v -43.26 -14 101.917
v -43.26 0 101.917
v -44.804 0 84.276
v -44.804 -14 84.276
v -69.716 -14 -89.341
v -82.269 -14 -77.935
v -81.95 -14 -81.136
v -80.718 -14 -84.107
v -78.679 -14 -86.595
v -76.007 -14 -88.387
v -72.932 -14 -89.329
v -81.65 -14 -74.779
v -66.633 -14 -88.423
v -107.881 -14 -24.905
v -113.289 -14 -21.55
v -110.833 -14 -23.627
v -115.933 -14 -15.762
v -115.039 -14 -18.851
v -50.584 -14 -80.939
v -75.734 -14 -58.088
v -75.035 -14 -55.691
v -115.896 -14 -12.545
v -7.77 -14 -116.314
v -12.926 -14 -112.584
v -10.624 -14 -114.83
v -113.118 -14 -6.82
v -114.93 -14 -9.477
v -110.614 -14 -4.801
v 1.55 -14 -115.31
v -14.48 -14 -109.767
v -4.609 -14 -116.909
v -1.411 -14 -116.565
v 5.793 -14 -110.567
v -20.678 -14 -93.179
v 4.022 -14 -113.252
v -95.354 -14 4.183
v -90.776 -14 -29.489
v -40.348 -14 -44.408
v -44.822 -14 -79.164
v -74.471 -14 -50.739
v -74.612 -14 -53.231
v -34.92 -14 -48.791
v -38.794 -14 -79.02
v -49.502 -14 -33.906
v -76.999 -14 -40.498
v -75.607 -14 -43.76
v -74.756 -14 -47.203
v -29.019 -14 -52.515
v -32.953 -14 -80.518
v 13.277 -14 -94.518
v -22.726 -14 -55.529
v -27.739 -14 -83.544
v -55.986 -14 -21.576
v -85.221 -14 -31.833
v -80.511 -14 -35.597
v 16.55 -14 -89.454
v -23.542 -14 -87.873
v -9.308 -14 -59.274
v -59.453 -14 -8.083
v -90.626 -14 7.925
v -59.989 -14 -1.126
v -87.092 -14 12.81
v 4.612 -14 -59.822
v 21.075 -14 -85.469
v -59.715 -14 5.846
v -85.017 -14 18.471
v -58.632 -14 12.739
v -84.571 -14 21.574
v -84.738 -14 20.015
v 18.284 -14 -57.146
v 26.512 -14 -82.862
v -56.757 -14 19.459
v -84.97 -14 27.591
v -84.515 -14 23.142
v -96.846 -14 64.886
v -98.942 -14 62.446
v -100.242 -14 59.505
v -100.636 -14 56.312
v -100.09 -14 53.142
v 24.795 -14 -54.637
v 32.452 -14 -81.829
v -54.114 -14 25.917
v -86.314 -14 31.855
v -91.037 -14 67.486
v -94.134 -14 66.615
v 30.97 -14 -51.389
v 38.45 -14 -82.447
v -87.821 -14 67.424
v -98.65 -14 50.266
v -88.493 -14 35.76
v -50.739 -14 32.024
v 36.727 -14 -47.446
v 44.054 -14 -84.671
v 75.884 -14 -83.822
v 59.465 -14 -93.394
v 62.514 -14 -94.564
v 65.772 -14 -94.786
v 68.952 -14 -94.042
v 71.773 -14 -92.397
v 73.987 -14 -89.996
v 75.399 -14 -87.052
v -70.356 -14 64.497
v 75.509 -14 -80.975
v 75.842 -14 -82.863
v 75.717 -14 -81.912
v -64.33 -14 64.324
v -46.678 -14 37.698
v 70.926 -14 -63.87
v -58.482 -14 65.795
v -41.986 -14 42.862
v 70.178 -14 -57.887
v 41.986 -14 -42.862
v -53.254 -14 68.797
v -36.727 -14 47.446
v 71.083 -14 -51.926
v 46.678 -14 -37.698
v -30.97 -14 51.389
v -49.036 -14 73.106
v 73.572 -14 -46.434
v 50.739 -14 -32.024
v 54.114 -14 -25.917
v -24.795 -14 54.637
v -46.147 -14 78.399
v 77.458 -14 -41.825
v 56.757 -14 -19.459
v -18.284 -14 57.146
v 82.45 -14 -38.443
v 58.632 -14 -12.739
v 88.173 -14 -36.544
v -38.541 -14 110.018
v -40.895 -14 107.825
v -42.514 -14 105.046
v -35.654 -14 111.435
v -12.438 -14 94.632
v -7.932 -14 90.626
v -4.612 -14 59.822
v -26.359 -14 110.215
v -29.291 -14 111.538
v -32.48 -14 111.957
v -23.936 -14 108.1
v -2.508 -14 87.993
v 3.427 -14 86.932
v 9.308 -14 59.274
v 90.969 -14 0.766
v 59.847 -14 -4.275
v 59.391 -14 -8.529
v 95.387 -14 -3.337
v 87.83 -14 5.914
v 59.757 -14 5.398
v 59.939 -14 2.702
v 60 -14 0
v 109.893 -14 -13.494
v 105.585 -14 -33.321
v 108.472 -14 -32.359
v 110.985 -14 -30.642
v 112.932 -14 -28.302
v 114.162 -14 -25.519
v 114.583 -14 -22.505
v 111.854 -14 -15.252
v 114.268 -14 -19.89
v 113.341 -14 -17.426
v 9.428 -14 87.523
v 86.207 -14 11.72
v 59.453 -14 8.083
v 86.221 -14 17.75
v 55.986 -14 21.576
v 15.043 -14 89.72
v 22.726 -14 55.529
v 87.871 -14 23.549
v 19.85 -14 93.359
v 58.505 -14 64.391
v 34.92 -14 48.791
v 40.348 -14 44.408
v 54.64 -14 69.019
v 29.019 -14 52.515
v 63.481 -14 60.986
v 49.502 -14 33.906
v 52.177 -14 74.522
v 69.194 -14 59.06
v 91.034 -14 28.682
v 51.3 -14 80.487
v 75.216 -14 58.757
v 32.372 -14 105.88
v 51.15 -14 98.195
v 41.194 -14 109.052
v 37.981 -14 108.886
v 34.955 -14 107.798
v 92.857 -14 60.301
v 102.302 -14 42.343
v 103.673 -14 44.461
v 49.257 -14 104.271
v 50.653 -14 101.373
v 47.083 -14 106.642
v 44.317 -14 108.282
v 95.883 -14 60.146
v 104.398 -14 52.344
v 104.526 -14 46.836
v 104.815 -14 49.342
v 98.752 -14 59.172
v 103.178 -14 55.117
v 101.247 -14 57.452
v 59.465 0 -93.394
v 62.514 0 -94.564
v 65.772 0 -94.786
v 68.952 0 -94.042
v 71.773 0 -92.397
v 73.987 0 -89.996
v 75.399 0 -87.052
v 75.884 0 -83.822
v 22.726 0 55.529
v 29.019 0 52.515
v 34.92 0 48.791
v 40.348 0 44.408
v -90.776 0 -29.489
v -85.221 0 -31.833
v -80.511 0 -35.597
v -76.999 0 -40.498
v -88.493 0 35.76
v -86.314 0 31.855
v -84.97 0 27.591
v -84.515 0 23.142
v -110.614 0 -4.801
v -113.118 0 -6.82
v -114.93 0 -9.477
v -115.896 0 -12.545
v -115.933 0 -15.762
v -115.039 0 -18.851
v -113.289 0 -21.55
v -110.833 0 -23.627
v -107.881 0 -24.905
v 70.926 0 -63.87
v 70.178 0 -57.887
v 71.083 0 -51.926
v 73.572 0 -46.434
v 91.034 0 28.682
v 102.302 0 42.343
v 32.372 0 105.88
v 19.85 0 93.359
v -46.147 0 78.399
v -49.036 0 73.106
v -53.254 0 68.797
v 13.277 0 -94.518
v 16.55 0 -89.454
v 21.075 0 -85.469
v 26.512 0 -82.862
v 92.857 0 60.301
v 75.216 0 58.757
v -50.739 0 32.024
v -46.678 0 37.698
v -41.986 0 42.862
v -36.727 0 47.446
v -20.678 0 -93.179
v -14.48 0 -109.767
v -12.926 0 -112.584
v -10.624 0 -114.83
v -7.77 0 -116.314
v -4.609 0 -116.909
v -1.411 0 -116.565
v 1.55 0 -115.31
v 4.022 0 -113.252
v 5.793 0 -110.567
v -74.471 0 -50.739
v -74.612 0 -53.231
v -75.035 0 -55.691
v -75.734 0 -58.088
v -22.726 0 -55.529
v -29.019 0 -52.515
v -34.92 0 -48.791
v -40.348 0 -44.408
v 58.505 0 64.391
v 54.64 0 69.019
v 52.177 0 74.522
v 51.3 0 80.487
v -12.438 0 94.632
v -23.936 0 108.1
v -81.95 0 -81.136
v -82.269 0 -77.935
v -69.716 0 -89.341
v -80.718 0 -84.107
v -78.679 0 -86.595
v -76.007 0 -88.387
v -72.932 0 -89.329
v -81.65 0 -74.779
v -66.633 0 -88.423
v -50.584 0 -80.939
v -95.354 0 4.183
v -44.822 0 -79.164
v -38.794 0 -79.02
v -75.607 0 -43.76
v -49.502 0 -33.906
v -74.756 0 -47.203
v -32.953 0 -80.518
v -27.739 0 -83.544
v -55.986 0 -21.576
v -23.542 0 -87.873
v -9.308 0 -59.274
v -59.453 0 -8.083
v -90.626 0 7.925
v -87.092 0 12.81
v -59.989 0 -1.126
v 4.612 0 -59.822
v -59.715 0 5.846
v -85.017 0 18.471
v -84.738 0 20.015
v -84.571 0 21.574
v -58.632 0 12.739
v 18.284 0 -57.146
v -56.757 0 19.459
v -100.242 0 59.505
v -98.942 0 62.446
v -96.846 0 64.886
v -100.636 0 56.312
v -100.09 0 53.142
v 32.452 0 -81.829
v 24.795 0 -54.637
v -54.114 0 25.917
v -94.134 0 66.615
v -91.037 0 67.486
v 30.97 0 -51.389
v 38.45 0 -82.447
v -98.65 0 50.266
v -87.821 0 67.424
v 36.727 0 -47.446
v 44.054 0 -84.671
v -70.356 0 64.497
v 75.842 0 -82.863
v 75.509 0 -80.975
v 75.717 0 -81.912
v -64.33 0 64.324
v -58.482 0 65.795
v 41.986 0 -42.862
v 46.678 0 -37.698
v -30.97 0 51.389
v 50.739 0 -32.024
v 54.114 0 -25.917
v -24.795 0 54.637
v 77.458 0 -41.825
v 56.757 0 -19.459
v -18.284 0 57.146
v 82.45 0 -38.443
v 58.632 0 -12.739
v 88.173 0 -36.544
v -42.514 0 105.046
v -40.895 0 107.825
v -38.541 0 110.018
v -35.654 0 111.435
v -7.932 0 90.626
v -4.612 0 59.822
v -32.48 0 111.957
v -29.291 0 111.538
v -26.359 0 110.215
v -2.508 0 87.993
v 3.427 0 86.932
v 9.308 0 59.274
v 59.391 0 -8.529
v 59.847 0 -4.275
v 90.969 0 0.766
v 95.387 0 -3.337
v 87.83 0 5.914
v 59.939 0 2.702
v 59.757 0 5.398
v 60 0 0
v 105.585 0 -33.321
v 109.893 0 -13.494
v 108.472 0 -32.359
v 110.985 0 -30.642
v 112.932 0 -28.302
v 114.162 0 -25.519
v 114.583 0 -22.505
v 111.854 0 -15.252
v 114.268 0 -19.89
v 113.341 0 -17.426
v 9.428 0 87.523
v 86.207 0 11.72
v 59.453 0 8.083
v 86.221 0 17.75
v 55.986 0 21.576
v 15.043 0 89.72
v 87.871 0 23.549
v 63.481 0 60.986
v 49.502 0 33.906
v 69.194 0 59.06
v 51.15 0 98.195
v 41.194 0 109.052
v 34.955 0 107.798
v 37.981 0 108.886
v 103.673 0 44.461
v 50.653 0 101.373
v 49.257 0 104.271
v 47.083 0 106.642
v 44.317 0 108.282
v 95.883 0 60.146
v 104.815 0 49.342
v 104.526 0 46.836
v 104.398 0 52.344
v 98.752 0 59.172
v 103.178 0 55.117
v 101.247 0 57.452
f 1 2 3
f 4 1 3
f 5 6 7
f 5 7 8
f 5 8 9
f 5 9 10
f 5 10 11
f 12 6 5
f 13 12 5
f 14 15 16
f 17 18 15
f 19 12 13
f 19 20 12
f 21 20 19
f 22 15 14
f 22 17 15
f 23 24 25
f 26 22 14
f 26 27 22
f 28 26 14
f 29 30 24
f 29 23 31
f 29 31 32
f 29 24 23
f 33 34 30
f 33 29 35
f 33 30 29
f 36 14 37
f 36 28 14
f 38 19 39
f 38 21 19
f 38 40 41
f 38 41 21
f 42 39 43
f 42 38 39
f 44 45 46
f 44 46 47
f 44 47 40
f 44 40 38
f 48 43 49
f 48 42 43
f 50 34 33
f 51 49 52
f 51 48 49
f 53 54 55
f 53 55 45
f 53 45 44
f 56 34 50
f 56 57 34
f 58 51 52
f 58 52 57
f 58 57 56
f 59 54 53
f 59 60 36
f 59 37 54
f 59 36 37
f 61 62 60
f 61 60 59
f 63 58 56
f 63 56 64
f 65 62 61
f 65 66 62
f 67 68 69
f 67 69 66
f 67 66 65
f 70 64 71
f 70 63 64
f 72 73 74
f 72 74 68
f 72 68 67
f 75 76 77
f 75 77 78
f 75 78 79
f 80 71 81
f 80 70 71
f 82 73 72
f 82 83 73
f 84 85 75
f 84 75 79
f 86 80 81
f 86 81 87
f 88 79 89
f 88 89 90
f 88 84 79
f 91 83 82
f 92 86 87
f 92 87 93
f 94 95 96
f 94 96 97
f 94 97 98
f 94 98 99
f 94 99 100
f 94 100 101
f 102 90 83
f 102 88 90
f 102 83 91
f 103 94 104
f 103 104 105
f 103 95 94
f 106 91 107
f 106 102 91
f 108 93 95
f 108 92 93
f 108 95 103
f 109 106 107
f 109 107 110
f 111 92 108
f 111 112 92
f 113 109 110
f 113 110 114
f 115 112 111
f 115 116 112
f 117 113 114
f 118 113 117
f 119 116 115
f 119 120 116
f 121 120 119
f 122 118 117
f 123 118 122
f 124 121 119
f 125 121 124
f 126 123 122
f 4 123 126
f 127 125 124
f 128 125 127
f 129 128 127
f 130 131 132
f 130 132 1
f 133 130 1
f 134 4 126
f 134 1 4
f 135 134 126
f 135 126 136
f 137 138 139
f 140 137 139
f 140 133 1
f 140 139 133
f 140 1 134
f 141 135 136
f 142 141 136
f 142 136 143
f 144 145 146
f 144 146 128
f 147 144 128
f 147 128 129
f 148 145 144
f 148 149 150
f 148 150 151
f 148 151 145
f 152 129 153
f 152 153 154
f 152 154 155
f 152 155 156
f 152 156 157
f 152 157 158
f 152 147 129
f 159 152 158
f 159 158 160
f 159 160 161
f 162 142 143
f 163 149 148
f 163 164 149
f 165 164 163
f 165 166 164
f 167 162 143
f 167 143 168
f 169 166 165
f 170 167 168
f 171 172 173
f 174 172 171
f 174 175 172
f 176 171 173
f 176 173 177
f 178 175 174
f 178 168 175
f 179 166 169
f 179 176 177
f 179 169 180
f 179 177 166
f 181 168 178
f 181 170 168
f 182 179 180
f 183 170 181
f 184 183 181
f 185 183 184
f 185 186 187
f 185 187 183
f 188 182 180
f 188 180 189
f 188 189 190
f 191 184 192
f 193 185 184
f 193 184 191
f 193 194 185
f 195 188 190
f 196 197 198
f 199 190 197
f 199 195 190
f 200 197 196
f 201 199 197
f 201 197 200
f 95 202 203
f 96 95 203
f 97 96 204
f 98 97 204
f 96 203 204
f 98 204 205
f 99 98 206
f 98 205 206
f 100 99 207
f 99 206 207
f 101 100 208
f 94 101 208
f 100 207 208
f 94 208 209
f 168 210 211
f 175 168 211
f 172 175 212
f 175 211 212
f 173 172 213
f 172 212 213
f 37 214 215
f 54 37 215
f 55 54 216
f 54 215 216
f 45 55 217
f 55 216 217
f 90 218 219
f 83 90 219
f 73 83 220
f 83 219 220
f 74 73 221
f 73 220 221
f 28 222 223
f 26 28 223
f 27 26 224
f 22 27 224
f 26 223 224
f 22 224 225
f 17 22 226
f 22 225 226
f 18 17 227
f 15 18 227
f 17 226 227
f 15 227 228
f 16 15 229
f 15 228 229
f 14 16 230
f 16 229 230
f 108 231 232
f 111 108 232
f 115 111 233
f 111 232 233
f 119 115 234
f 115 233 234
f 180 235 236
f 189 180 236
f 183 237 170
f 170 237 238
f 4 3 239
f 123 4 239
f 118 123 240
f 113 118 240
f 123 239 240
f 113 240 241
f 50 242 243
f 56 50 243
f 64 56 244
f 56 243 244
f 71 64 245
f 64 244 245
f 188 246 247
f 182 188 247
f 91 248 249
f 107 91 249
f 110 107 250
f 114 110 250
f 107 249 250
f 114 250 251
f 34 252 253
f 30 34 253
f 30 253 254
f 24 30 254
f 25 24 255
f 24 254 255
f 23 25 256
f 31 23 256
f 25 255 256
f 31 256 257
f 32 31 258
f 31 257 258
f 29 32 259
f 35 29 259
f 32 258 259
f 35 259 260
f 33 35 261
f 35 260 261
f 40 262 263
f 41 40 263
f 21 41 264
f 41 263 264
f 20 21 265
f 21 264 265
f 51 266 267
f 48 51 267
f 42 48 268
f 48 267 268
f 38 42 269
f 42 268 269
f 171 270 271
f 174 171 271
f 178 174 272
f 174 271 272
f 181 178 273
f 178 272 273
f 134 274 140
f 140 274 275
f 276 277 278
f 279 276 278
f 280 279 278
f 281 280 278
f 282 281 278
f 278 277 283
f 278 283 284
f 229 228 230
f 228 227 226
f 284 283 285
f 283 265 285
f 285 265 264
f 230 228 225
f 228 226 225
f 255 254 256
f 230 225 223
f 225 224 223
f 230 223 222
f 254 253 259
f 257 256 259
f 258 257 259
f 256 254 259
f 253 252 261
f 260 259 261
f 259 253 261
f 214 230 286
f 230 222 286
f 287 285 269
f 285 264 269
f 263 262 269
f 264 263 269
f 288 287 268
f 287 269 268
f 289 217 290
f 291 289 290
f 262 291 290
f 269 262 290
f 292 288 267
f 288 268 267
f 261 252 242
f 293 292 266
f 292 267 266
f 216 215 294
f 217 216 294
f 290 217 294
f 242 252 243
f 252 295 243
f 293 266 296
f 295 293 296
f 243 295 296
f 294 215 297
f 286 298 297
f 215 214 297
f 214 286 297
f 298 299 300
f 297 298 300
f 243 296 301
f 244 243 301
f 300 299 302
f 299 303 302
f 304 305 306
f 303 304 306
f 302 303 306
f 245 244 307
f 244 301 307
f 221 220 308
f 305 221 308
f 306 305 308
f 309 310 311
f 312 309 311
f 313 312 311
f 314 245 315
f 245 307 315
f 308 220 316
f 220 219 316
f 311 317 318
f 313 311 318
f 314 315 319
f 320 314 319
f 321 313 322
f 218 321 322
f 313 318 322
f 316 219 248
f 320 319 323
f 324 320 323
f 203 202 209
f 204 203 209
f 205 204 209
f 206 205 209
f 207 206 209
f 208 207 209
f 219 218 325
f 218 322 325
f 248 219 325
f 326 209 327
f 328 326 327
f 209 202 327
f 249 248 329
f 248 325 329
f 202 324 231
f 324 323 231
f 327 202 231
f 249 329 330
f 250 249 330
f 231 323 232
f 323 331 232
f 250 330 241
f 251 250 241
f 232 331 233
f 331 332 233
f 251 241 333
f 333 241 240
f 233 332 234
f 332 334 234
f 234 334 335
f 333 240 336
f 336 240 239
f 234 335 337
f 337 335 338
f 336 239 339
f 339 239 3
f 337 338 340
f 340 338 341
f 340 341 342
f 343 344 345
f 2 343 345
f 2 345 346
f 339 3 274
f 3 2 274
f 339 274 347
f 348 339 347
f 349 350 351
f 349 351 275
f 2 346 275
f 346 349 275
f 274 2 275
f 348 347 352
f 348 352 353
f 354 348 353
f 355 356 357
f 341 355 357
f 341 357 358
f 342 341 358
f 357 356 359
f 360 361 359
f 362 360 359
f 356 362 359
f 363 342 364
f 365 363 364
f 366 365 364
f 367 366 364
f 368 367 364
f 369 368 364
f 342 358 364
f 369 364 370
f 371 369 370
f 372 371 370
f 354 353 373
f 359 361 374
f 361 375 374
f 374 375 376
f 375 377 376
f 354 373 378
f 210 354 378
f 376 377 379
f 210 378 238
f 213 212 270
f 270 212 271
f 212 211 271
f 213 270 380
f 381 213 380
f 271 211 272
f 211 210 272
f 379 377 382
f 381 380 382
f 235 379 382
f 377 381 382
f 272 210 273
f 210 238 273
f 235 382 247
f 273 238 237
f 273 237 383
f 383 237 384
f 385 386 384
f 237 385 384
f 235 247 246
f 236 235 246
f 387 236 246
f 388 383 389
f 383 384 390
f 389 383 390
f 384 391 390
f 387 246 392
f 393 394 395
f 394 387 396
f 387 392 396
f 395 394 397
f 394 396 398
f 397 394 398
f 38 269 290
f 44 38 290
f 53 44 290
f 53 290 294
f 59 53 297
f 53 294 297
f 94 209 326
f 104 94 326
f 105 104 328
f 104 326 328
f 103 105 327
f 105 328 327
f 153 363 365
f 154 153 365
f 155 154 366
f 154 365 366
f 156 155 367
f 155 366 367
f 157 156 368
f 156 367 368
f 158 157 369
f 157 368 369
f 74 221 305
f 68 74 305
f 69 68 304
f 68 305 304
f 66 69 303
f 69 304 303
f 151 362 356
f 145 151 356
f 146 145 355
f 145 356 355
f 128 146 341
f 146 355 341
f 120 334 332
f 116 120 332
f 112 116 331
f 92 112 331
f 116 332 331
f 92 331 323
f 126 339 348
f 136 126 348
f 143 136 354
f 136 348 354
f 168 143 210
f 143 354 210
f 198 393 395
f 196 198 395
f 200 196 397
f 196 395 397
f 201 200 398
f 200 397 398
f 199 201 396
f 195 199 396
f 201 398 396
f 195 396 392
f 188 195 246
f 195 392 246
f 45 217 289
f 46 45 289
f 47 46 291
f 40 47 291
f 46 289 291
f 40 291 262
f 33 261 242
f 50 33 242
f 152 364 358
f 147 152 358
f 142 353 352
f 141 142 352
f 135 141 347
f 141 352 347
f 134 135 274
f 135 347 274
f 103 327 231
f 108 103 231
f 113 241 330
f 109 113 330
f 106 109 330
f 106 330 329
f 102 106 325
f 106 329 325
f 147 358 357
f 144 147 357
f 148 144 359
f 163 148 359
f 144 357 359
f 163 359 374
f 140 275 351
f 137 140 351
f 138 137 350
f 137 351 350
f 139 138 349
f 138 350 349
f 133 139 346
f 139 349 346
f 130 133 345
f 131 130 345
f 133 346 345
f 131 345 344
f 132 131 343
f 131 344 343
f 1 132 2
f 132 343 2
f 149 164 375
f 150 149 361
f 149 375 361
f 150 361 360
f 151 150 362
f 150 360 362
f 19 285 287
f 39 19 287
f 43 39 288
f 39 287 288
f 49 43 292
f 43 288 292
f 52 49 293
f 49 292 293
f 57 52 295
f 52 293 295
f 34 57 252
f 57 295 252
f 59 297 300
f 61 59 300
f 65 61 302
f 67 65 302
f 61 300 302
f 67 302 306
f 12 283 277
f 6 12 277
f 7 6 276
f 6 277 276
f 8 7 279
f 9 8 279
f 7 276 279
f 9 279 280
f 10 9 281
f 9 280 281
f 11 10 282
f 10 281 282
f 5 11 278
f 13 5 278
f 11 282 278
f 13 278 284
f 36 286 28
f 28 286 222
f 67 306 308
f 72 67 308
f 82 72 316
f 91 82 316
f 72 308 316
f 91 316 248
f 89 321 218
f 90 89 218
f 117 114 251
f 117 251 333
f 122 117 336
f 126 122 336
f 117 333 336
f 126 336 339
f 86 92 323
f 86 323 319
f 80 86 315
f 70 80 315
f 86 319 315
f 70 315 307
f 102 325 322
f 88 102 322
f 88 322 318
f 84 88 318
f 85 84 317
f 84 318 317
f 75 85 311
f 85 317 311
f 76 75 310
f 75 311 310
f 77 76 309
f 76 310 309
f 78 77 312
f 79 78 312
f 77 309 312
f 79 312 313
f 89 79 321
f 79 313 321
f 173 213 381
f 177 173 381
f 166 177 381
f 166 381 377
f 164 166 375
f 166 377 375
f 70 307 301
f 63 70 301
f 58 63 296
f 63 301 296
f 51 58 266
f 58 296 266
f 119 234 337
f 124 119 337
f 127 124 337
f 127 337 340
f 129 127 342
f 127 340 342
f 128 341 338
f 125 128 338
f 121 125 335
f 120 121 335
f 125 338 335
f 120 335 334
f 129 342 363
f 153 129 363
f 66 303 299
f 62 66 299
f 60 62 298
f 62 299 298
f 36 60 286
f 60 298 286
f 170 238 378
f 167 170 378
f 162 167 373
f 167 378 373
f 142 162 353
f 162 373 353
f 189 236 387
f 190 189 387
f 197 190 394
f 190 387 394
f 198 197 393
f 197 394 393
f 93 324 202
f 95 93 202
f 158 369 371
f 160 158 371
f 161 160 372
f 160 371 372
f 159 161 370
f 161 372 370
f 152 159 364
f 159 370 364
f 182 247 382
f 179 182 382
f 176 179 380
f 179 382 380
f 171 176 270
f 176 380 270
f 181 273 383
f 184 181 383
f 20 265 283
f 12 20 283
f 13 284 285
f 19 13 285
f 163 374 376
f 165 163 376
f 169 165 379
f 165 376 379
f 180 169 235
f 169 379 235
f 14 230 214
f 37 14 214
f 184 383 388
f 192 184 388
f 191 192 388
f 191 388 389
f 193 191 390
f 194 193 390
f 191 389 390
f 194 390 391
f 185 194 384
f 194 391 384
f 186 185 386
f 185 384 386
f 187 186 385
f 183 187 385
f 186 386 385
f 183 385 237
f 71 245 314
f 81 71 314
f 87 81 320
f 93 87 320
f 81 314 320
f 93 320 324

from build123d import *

# Parameters (mm, degrees)
F1_DEPTH = 14


# Not quite as in the source:
# - ends of sketch curves that miss each other by under 0.0002 mm in the source are joined


with BuildPart() as f1:
    # F0 (on Front) → F1 (new body)
    with BuildSketch(Plane.XZ):
        with BuildLine():
            ThreePointArc((32.3720842786, 105.8801466631), (29.3660148862, 95.9331361741), (35.9835922354, 87.9214484062))
            ThreePointArc((35.9835922354, 87.9214484062), (46.2807034104, 88.9685979346), (51.1501134416, 98.1018266427))
            ThreePointArc((51.1501134416, 98.1018266427), (51.1500147285, 98.1484278976), (51.1497185912, 98.1950283161))
            ThreePointArc((51.1497185912, 98.1950283161), (44.3166346477, 108.2822048792), (32.3720842786, 105.8801466631))
        make_face()
        with BuildLine():
            ThreePointArc((32.9533949945, 80.5175369614), (46.4344825558, 73.5719975927), (58.5046818367, 64.3910102669))
            ThreePointArc((58.5046818367, 64.3910102669), (53.2187863313, 71.68567665), (51.2997586494, 80.4873913517))
            Line((51.2997586494, 80.4873913517), (51.1497185912, 98.1950283161))
            ThreePointArc((51.1497185912, 98.1950283161), (51.1500147285, 98.1484278976), (51.1501134416, 98.1018266427))
            ThreePointArc((51.1501134416, 98.1018266427), (46.2807034104, 88.9685979346), (35.9835922354, 87.9214484062))
            Line((35.9835922354, 87.9214484062), (32.9533949945, 80.5175369614))
        make_face()
        with BuildLine():
            ThreePointArc((3.4274426795, 86.9324602015), (18.4710353665, 85.0165916306), (32.9533949945, 80.5175369614))
            Line((32.9533949945, 80.5175369614), (35.9835922354, 87.9214484062))
            ThreePointArc((35.9835922354, 87.9214484062), (29.3660148862, 95.9331361741), (32.3720842786, 105.8801466631))
            Line((32.3720842786, 105.8801466631), (19.8502105167, 93.3587411362))
            ThreePointArc((19.8502105167, 93.3587411362), (12.3109167385, 88.4280317588), (3.4274426795, 86.9324602015))
        make_face()
        with BuildLine():
            Line((22.7264793065, 55.5293358355), (32.9533949945, 80.5175369614))
            ThreePointArc((32.9533949945, 80.5175369614), (18.4710353665, 85.0165916306), (3.4274426795, 86.9324602015))
            Line((3.4274426795, 86.9324602015), (2.3637534996, 59.9534208315))
            ThreePointArc((2.3637534996, 59.9534208315), (12.7386450449, 58.6321321668), (22.7264793065, 55.5293358355))
        make_face()
        with BuildLine():
            Line((40.348056302, 44.407593412), (58.5046816379, 64.3910104474))
            ThreePointArc((58.5046816379, 64.3910104474), (46.4344825558, 73.5719975927), (32.9533949945, 80.5175369614))
            Line((32.9533949945, 80.5175369614), (22.7264793065, 55.5293358355))
            ThreePointArc((22.7264793065, 55.5293358355), (32.0237809946, 50.739308734), (40.348056302, 44.407593412))
        make_face()
        with BuildLine():
            ThreePointArc((58.5046818367, 64.3910102669), (68.7972457691, 53.2535348554), (76.9994402387, 40.4979777634))
            Line((76.9994402387, 40.4979777634), (84.0798485365, 44.2219297416))
            ThreePointArc((84.0798485365, 44.2219297416), (84.1603038112, 54.6129353624), (92.8569016607, 60.3005233139))
            Line((92.8569016607, 60.3005233139), (75.2159855194, 58.7574754942))
            ThreePointArc((75.2159855194, 58.7574754942), (66.2711525981, 59.8264975753), (58.5046818367, 64.3910102669))
        make_face()
        with BuildLine():
            ThreePointArc((92.8569016607, 60.3005233139), (84.1603038112, 54.6129353624), (84.0798485365, 44.2219297416))
            ThreePointArc((84.0798485365, 44.2219297416), (92.687333506, 38.4003600768), (102.3015052283, 42.3433504341))
            ThreePointArc((102.3015052283, 42.3433504341), (104.1678745826, 45.6239667523), (104.815409946, 49.3423637117))
            ThreePointArc((104.815409946, 49.3423637117), (101.2469780464, 57.4523449428), (92.8569016607, 60.3005233139))
        make_face()
        with BuildLine():
            ThreePointArc((76.9994402387, 40.4979777634), (82.8620458637, 26.5119096875), (86.2069300455, 11.7202906163))
            ThreePointArc((86.2069300455, 11.7202906163), (86.8466202271, 20.7060376023), (91.0341929436, 28.6820696464))
            Line((91.0341929436, 28.6820696464), (102.3015052283, 42.3433504341))
            ThreePointArc((102.3015052283, 42.3433504341), (92.687333506, 38.4003600768), (84.0798485365, 44.2219297416))
            Line((84.0798485365, 44.2219297416), (76.9994402387, 40.4979777634))
        make_face()
        with BuildLine():
            Line((53.1030622336, 27.9296398368), (76.9994402387, 40.4979777634))
            ThreePointArc((76.9994402387, 40.4979777634), (68.7972457691, 53.2535348554), (58.5046818367, 64.3910102669))
            Line((58.5046818367, 64.3910102669), (40.348056302, 44.407593412))
            ThreePointArc((40.348056302, 44.407593412), (47.4463763358, 36.7265758355), (53.1030622336, 27.9296398368))
        make_face()
        with BuildLine():
            Line((59.4530551421, 8.0829594997), (86.206929956, 11.7202912746))
            ThreePointArc((86.206929956, 11.7202912746), (82.8620458637, 26.5119096875), (76.9994402387, 40.4979777634))
            Line((76.9994402387, 40.4979777634), (53.1030622336, 27.9296398368))
            ThreePointArc((53.1030622336, 27.9296398368), (57.1462384569, 18.2840758647), (59.4530551421, 8.0829594997))
        make_face()
        with BuildLine():
            ThreePointArc((85.0165916418, -18.4710353151), (86.5027267571, -9.2886093459), (87, 0))
            ThreePointArc((87, 0), (86.8015060755, 5.8735460346), (86.2069300455, 11.7202906163))
            Line((86.2069300455, 11.7202906163), (59.4530551421, 8.0829594997))
            ThreePointArc((59.4530551421, 8.0829594997), (59.8631076228, 4.0507216317), (60, 0))
            ThreePointArc((60, 0), (59.657052936, -6.40593748), (58.6321321668, -12.7386450449))
            Line((58.6321321668, -12.7386450449), (85.0165916418, -18.4710353151))
        make_face()
        with BuildLine():
            ThreePointArc((86.2069300455, 11.7202906163), (86.8015060755, 5.8735460346), (87, 0))
            ThreePointArc((87, 0), (86.5027267571, -9.2886093459), (85.0165916418, -18.4710353151))
            Line((85.0165916418, -18.4710353151), (92.834209264, -20.169521321))
            ThreePointArc((92.834209264, -20.169521321), (99.5750512453, -12.2612648605), (109.8929427662, -13.4943850596))
            Line((109.8929427662, -13.4943850596), (95.3873649649, -3.3370659482))
            ThreePointArc((95.3873649649, -3.3370659482), (89.2223796623, 3.2314800802), (86.2069300455, 11.7202906163))
        make_face()
        with BuildLine():
            ThreePointArc((109.8929427662, -13.4943850596), (99.5750512453, -12.2612648605), (92.834209264, -20.169521321))
            ThreePointArc((92.834209264, -20.169521321), (95.6858924447, -30.1618871019), (105.5852806145, -33.32125171))
            ThreePointArc((105.5852806145, -33.32125171), (112.0398014596, -29.5398412019), (114.5834334946, -22.5049395793))
            ThreePointArc((114.5834334946, -22.5049395793), (113.3406001425, -17.4257960485), (109.8929427662, -13.4943850596))
        make_face()
        with BuildLine():
            Line((92.834209264, -20.169521321), (85.0165916418, -18.4710353151))
            ThreePointArc((85.0165916418, -18.4710353151), (80.5175370893, -32.953394682), (73.5719980248, -46.4344818712))
            ThreePointArc((73.5719980248, -46.4344818712), (79.8379557996, -39.9621860052), (88.1727166272, -36.5439112122))
            Line((88.1727166272, -36.5439112122), (105.5852806145, -33.32125171))
            ThreePointArc((105.5852806145, -33.32125171), (95.6858924447, -30.1618871019), (92.834209264, -20.169521321))
        make_face()
        with BuildLine():
            ThreePointArc((73.5719980248, -46.4344818712), (80.5175370893, -32.953394682), (85.0165916418, -18.4710353151))
            Line((85.0165916418, -18.4710353151), (58.6321321668, -12.7386450449))
            ThreePointArc((58.6321321668, -12.7386450449), (55.5293358355, -22.7264793065), (50.739308734, -32.0237809946))
            Line((50.739308734, -32.0237809946), (73.5719980248, -46.4344818712))
        make_face()
        with BuildLine():
            ThreePointArc((53.2535349615, -68.7972456869), (64.3910106745, -58.5046813881), (73.5719980248, -46.4344818712))
            Line((73.5719980248, -46.4344818712), (50.739308734, -32.0237809946))
            ThreePointArc((50.739308734, -32.0237809946), (44.407593412, -40.348056302), (36.7265758355, -47.4463763358))
            Line((36.7265758355, -47.4463763358), (53.2535349615, -68.7972456869))
        make_face()
        with BuildLine():
            ThreePointArc((70.9259362309, -63.8701571461), (70.4254635991, -54.875582133), (73.5719980248, -46.4344818712))
            ThreePointArc((73.5719980248, -46.4344818712), (64.3910106745, -58.5046813881), (53.2535349615, -68.7972456869))
            Line((53.2535349615, -68.7972456869), (58.1504117396, -75.1234291983))
            ThreePointArc((58.1504117396, -75.1234291983), (68.3975255483, -73.3982829864), (75.5088546274, -80.9751206903))
            Line((75.5088546274, -80.9751206903), (70.9259362309, -63.8701571461))
        make_face()
        with BuildLine():
            ThreePointArc((75.5088546274, -80.9751206903), (68.3975255483, -73.3982829864), (58.1504117396, -75.1234291983))
            ThreePointArc((58.1504117396, -75.1234291983), (53.9119588783, -84.6110520937), (59.4645297515, -93.3944698544))
            ThreePointArc((59.4645297515, -93.3944698544), (70.4239258235, -93.3248248527), (75.8836173094, -83.8219315266))
            ThreePointArc((75.8836173094, -83.8219315266), (75.7895242066, -82.3862453661), (75.5088546274, -80.9751206903))
        make_face()
        with BuildLine():
            Line((58.1504117396, -75.1234291983), (53.2535349615, -68.7972456869))
            ThreePointArc((53.2535349615, -68.7972456869), (40.4979775935, -76.9994403281), (26.5119096382, -82.8620458795))
            ThreePointArc((26.5119096382, -82.8620458795), (35.4722238433, -81.9316592406), (44.0542462703, -84.6705898743))
            Line((44.0542462703, -84.6705898743), (59.4645297515, -93.3944698544))
            ThreePointArc((59.4645297515, -93.3944698544), (53.9119588783, -84.6110520937), (58.1504117396, -75.1234291983))
        make_face()
        with BuildLine():
            ThreePointArc((26.5119096382, -82.8620458795), (40.4979775935, -76.9994403281), (53.2535349615, -68.7972456869))
            Line((53.2535349615, -68.7972456869), (36.7265758355, -47.4463763358))
            ThreePointArc((36.7265758355, -47.4463763358), (27.9296398368, -53.1030622336), (18.2840758647, -57.1462384569))
            Line((18.2840758647, -57.1462384569), (26.5119096382, -82.8620458795))
        make_face()
        with BuildLine():
            ThreePointArc((18.2840758647, -57.1462384569), (8.0829594997, -59.4530551421), (-2.3637534996, -59.9534208315))
            Line((-2.3637534996, -59.9534208315), (-3.4274425744, -86.9324602056))
            ThreePointArc((-3.4274425744, -86.9324602056), (11.7202910843, -86.2069299819), (26.5119096382, -82.8620458795))
            Line((26.5119096382, -82.8620458795), (18.2840758647, -57.1462384569))
        make_face()
        with BuildLine():
            ThreePointArc((6.8240354841, -105.9177101356), (3.7539441497, -98.2942890824), (-3.7426097076, -94.9262496498))
            ThreePointArc((-3.7426097076, -94.9262496498), (-13.087979412, -99.4697654637), (-14.4803354569, -109.7673775901))
            ThreePointArc((-14.4803354569, -109.7673775901), (-4.6093193242, -116.9091706213), (5.793334221, -110.5666974118))
            ThreePointArc((5.793334221, -110.5666974118), (6.5632693047, -108.2986462849), (6.8240354841, -105.9177101356))
        make_face()
        with BuildLine():
            ThreePointArc((13.2774736805, -94.5176919775), (18.6756903773, -87.3057505138), (26.5119096382, -82.8620458795))
            ThreePointArc((26.5119096382, -82.8620458795), (11.7202910843, -86.2069299819), (-3.4274425744, -86.9324602056))
            Line((-3.4274425744, -86.9324602056), (-3.7426097076, -94.9262496498))
            ThreePointArc((-3.7426097076, -94.9262496498), (3.7539441497, -98.2942890824), (6.8240354841, -105.9177101356))
            ThreePointArc((6.8240354841, -105.9177101356), (6.5632693047, -108.2986462849), (5.793334221, -110.5666974118))
            Line((5.793334221, -110.5666974118), (13.2774736805, -94.5176919775))
        make_face()
        with BuildLine():
            Line((-3.7426097076, -94.9262496498), (-3.4274425744, -86.9324602056))
            ThreePointArc((-3.4274425744, -86.9324602056), (-18.4710353211, -85.0165916405), (-32.9533950059, -80.5175369568))
            ThreePointArc((-32.9533950059, -80.5175369568), (-25.4913553114, -85.5643983847), (-20.6776955249, -93.1789585254))
            Line((-20.6776955249, -93.1789585254), (-14.4803354569, -109.7673775901))
            ThreePointArc((-14.4803354569, -109.7673775901), (-13.087979412, -99.4697654637), (-3.7426097076, -94.9262496498))
        make_face()
        with BuildLine():
            ThreePointArc((-32.9533950059, -80.5175369568), (-46.4344824475, -73.571997661), (-58.5046816379, -64.3910104474))
            Line((-58.5046816379, -64.3910104474), (-63.8844224782, -70.3120229024))
            ThreePointArc((-63.8844224782, -70.3120229024), (-61.2225259157, -74.0019310175), (-60.2815661336, -78.4534150279))
            ThreePointArc((-60.2815661336, -78.4534150279), (-62.0043154825, -84.3637974485), (-66.6329516532, -88.4228876024))
            Line((-66.6329516532, -88.4228876024), (-50.5836663677, -80.9393482856))
            ThreePointArc((-50.5836663677, -80.9393482856), (-41.812645664, -78.8845874059), (-32.9533950059, -80.5175369568))
        make_face()
        with BuildLine():
            ThreePointArc((-60.2815661336, -78.4534150279), (-61.2225259157, -74.0019310175), (-63.8844224782, -70.3120229024))
            ThreePointArc((-63.8844224782, -70.3120229024), (-73.9639066787, -67.7854700899), (-81.649690774, -74.7789094228))
            ThreePointArc((-81.649690774, -74.7789094228), (-78.678709789, -86.5948071535), (-66.6329516532, -88.4228876024))
            ThreePointArc((-66.6329516532, -88.4228876024), (-62.0043154825, -84.3637974485), (-60.2815661336, -78.4534150279))
        make_face()
        with BuildLine():
            Line((-63.8844224782, -70.3120229024), (-58.5046816379, -64.3910104474))
            ThreePointArc((-58.5046816379, -64.3910104474), (-68.7972458297, -53.253534777), (-76.999440456, -40.4979773503))
            ThreePointArc((-76.999440456, -40.4979773503), (-75.1121373522, -45.464601551), (-74.4705630577, -50.7388457036))
            ThreePointArc((-74.4705630577, -50.7388457036), (-74.7888024722, -54.4672847753), (-75.734313777, -58.0878569137))
            Line((-75.734313777, -58.0878569137), (-81.649690774, -74.7789094228))
            ThreePointArc((-81.649690774, -74.7789094228), (-73.9639066787, -67.7854700899), (-63.8844224782, -70.3120229024))
        make_face()
        with BuildLine():
            ThreePointArc((-76.999440456, -40.4979773503), (-82.8620458336, -26.5119097816), (-86.206929956, -11.7202912746))
            Line((-86.206929956, -11.7202912746), (-94.1340039749, -12.7980192079))
            ThreePointArc((-94.1340039749, -12.7980192079), (-94.0588276868, -13.537262817), (-94.033730751, -14.2798951161))
            ThreePointArc((-94.033730751, -14.2798951161), (-98.3374366156, -23.0068444601), (-107.880938906, -24.9050259728))
            Line((-107.880938906, -24.9050259728), (-90.7761467477, -29.4885839902))
            ThreePointArc((-90.7761467477, -29.4885839902), (-82.7363804202, -33.5524491272), (-76.999440456, -40.4979773503))
        make_face()
        with BuildLine():
            ThreePointArc((-94.033730751, -14.2798951161), (-94.0588276868, -13.537262817), (-94.1340039749, -12.7980192079))
            ThreePointArc((-94.1340039749, -12.7980192079), (-100.2312999932, -4.3835999095), (-110.6142483426, -4.8005584616))
            ThreePointArc((-110.6142483426, -4.8005584616), (-115.933457527, -15.7617710244), (-107.880938906, -24.9050259728))
            ThreePointArc((-107.880938906, -24.9050259728), (-98.3374366156, -23.0068444601), (-94.033730751, -14.2798951161))
        make_face()
        with BuildLine():
            Line((-94.1340039749, -12.7980192079), (-86.206929956, -11.7202912746))
            ThreePointArc((-86.206929956, -11.7202912746), (-86.9324602051, 3.4274425869), (-85.0165916365, 18.4710353397))
            ThreePointArc((-85.0165916365, 18.4710353397), (-88.6910103034, 10.2459824979), (-95.3540049197, 4.1831985225))
            Line((-95.3540049197, 4.1831985225), (-110.6142483426, -4.8005584616))
            ThreePointArc((-110.6142483426, -4.8005584616), (-100.2312999932, -4.3835999095), (-94.1340039749, -12.7980192079))
        make_face()
        with BuildLine():
            ThreePointArc((-98.6502358817, 50.2661740979), (-89.3763413047, 45.5784934095), (-80.3372388289, 50.7043199082))
            ThreePointArc((-80.3372388289, 50.7043199082), (-79.0724148015, 53.5195545963), (-78.6394454301, 56.5753464239))
            ThreePointArc((-78.6394454301, 56.5753464239), (-81.2429868836, 63.6816453112), (-87.8211697714, 67.424027156))
            ThreePointArc((-87.8211697714, 67.424027156), (-98.9416520314, 62.4463729395), (-98.6502358817, 50.2661740979))
        make_face()
        with BuildLine():
            ThreePointArc((-85.0165916365, 18.4710353397), (-80.5175369567, 32.9533950061), (-73.5719976643, 46.4344824422))
            Line((-73.5719976643, 46.4344824422), (-80.3372388289, 50.7043199082))
            ThreePointArc((-80.3372388289, 50.7043199082), (-89.3763413047, 45.5784934095), (-98.6502358817, 50.2661740979))
            Line((-98.6502358817, 50.2661740979), (-88.4934591999, 35.7602164834))
            ThreePointArc((-88.4934591999, 35.7602164834), (-85.533205342, 29.7572032719), (-84.515040103, 23.1418718315))
            ThreePointArc((-84.515040103, 23.1418718315), (-84.6407873584, 20.7930281014), (-85.0165916365, 18.4710353397))
        make_face()
        with BuildLine():
            Line((-80.3372388289, 50.7043199082), (-73.5719976643, 46.4344824422))
            ThreePointArc((-73.5719976643, 46.4344824422), (-64.3910104254, 58.5046816622), (-53.2535349098, 68.7972457269))
            ThreePointArc((-53.2535349098, 68.7972457269), (-61.3552649793, 64.8583604753), (-70.3564974187, 64.496888879))
            Line((-70.3564974187, 64.496888879), (-87.8211697714, 67.424027156))
            ThreePointArc((-87.8211697714, 67.424027156), (-81.2429868836, 63.6816453112), (-78.6394454301, 56.5753464239))
            ThreePointArc((-78.6394454301, 56.5753464239), (-79.0724148015, 53.5195545963), (-80.3372388289, 50.7043199082))
        make_face()
        with BuildLine():
            ThreePointArc((-53.2535349098, 68.7972457269), (-40.4979777344, 76.999440254), (-26.5119100039, 82.8620457625))
            Line((-26.5119100039, 82.8620457625), (-28.9497867858, 90.4815442234))
            ThreePointArc((-28.9497867858, 90.4815442234), (-39.1689587709, 92.3651563918), (-43.259991113, 101.917272662))
            Line((-43.259991113, 101.917272662), (-44.8036985972, 84.2764142338))
            ThreePointArc((-44.8036985972, 84.2764142338), (-47.4097338159, 75.6531070707), (-53.2535349098, 68.7972457269))
        make_face()
        with BuildLine():
            ThreePointArc((-26.5119100039, 82.8620457625), (-11.7202912224, 86.2069299631), (3.4274426795, 86.9324602015))
            ThreePointArc((3.4274426795, 86.9324602015), (-5.3107092774, 89.1227907409), (-12.4384028502, 94.6317681259))
            Line((-12.4384028502, 94.6317681259), (-23.9355898405, 108.1001611328))
            ThreePointArc((-23.9355898405, 108.1001611328), (-21.9812798602, 104.7643332773), (-21.301867361, 100.9583546072))
            ThreePointArc((-21.301867361, 100.9583546072), (-23.4172490145, 94.4727122461), (-28.9497867858, 90.4815442234))
            Line((-28.9497867858, 90.4815442234), (-26.5119100039, 82.8620457625))
        make_face()
        with BuildLine():
            ThreePointArc((-43.259991113, 101.917272662), (-39.1689587709, 92.3651563918), (-28.9497867858, 90.4815442234))
            ThreePointArc((-28.9497867858, 90.4815442234), (-23.4172490145, 94.4727122461), (-21.301867361, 100.9583546072))
            ThreePointArc((-21.301867361, 100.9583546072), (-21.9812798602, 104.7643332773), (-23.9355898405, 108.1001611328))
            ThreePointArc((-23.9355898405, 108.1001611328), (-35.6539479362, 111.4351649909), (-43.259991113, 101.917272662))
        make_face()
        with BuildLine():
            Line((-26.5119100039, 82.8620457625), (-18.2840758647, 57.1462384569))
            ThreePointArc((-18.2840758647, 57.1462384569), (-8.0829594997, 59.4530551421), (2.3637534996, 59.9534208315))
            Line((2.3637534996, 59.9534208315), (3.4274425744, 86.9324602056))
            ThreePointArc((3.4274425744, 86.9324602056), (-11.7202912224, 86.2069299631), (-26.5119100039, 82.8620457625))
        make_face()
        with BuildLine():
            ThreePointArc((-36.7265758355, 47.4463763358), (-27.9296398368, 53.1030622336), (-18.2840758647, 57.1462384569))
            Line((-18.2840758647, 57.1462384569), (-26.5119100039, 82.8620457625))
            ThreePointArc((-26.5119100039, 82.8620457625), (-40.4979777344, 76.999440254), (-53.2535349098, 68.7972457269))
            Line((-53.2535349615, 68.7972456869), (-36.7265758355, 47.4463763358))
        make_face()
        with BuildLine():
            Line((-73.5719976643, 46.4344824422), (-50.739308734, 32.0237809946))
            ThreePointArc((-50.739308734, 32.0237809946), (-44.407593412, 40.348056302), (-36.7265758355, 47.4463763358))
            Line((-36.7265758355, 47.4463763358), (-53.2535349615, 68.7972456869))
            ThreePointArc((-53.2535349098, 68.7972457269), (-64.3910104254, 58.5046816622), (-73.5719976643, 46.4344824422))
        make_face()
        with BuildLine():
            ThreePointArc((-58.6321321668, 12.7386450449), (-55.5293358355, 22.7264793065), (-50.739308734, 32.0237809946))
            Line((-50.739308734, 32.0237809946), (-73.5719976643, 46.4344824422))
            ThreePointArc((-73.5719976643, 46.4344824422), (-80.5175369567, 32.9533950061), (-85.0165916365, 18.4710353397))
            Line((-85.0165916418, 18.4710353151), (-58.6321321668, 12.7386450449))
        make_face()
        with BuildLine():
            Line((-86.206929956, -11.7202912746), (-59.4530551421, -8.0829594997))
            ThreePointArc((-59.4530551421, -8.0829594997), (-59.9534208315, 2.3637534996), (-58.6321321668, 12.7386450449))
            Line((-58.6321321668, 12.7386450449), (-85.0165916418, 18.4710353151))
            ThreePointArc((-85.0165916365, 18.4710353397), (-86.9324602051, 3.4274425869), (-86.206929956, -11.7202912746))
        make_face()
        with BuildLine():
            ThreePointArc((-53.1030622336, -27.9296398368), (-57.1462384569, -18.2840758647), (-59.4530551421, -8.0829594997))
            Line((-59.4530551421, -8.0829594997), (-86.206929956, -11.7202912746))
            ThreePointArc((-86.206929956, -11.7202912746), (-82.8620458336, -26.5119097816), (-76.999440456, -40.4979773503))
            Line((-76.999440456, -40.4979773503), (-53.1030622336, -27.9296398368))
        make_face()
        with BuildLine():
            Line((-58.5046816379, -64.3910104474), (-40.348056302, -44.407593412))
            ThreePointArc((-40.348056302, -44.407593412), (-47.4463763358, -36.7265758355), (-53.1030622336, -27.9296398368))
            Line((-53.1030622336, -27.9296398368), (-76.9994402387, -40.4979777634))
            ThreePointArc((-76.9994402387, -40.4979777634), (-68.7972458297, -53.253534777), (-58.5046816379, -64.3910104474))
        make_face()
        with BuildLine():
            ThreePointArc((-22.7264793065, -55.5293358355), (-32.0237809946, -50.739308734), (-40.348056302, -44.407593412))
            Line((-40.348056302, -44.407593412), (-58.5046816379, -64.3910104474))
            ThreePointArc((-58.5046816379, -64.3910104474), (-46.4344824475, -73.571997661), (-32.9533950059, -80.5175369568))
            Line((-32.9533949945, -80.5175369614), (-22.7264793065, -55.5293358355))
        make_face()
        with BuildLine():
            Line((-3.4274425744, -86.9324602056), (-2.3637534996, -59.9534208315))
            ThreePointArc((-2.3637534996, -59.9534208315), (-12.7386450449, -58.6321321668), (-22.7264793065, -55.5293358355))
            Line((-22.7264793065, -55.5293358355), (-32.9533949945, -80.5175369614))
            ThreePointArc((-32.9533950059, -80.5175369568), (-18.4710353211, -85.0165916405), (-3.4274425744, -86.9324602056))
        make_face()
    extrude(amount=F1_DEPTH)


solid = f1.part
